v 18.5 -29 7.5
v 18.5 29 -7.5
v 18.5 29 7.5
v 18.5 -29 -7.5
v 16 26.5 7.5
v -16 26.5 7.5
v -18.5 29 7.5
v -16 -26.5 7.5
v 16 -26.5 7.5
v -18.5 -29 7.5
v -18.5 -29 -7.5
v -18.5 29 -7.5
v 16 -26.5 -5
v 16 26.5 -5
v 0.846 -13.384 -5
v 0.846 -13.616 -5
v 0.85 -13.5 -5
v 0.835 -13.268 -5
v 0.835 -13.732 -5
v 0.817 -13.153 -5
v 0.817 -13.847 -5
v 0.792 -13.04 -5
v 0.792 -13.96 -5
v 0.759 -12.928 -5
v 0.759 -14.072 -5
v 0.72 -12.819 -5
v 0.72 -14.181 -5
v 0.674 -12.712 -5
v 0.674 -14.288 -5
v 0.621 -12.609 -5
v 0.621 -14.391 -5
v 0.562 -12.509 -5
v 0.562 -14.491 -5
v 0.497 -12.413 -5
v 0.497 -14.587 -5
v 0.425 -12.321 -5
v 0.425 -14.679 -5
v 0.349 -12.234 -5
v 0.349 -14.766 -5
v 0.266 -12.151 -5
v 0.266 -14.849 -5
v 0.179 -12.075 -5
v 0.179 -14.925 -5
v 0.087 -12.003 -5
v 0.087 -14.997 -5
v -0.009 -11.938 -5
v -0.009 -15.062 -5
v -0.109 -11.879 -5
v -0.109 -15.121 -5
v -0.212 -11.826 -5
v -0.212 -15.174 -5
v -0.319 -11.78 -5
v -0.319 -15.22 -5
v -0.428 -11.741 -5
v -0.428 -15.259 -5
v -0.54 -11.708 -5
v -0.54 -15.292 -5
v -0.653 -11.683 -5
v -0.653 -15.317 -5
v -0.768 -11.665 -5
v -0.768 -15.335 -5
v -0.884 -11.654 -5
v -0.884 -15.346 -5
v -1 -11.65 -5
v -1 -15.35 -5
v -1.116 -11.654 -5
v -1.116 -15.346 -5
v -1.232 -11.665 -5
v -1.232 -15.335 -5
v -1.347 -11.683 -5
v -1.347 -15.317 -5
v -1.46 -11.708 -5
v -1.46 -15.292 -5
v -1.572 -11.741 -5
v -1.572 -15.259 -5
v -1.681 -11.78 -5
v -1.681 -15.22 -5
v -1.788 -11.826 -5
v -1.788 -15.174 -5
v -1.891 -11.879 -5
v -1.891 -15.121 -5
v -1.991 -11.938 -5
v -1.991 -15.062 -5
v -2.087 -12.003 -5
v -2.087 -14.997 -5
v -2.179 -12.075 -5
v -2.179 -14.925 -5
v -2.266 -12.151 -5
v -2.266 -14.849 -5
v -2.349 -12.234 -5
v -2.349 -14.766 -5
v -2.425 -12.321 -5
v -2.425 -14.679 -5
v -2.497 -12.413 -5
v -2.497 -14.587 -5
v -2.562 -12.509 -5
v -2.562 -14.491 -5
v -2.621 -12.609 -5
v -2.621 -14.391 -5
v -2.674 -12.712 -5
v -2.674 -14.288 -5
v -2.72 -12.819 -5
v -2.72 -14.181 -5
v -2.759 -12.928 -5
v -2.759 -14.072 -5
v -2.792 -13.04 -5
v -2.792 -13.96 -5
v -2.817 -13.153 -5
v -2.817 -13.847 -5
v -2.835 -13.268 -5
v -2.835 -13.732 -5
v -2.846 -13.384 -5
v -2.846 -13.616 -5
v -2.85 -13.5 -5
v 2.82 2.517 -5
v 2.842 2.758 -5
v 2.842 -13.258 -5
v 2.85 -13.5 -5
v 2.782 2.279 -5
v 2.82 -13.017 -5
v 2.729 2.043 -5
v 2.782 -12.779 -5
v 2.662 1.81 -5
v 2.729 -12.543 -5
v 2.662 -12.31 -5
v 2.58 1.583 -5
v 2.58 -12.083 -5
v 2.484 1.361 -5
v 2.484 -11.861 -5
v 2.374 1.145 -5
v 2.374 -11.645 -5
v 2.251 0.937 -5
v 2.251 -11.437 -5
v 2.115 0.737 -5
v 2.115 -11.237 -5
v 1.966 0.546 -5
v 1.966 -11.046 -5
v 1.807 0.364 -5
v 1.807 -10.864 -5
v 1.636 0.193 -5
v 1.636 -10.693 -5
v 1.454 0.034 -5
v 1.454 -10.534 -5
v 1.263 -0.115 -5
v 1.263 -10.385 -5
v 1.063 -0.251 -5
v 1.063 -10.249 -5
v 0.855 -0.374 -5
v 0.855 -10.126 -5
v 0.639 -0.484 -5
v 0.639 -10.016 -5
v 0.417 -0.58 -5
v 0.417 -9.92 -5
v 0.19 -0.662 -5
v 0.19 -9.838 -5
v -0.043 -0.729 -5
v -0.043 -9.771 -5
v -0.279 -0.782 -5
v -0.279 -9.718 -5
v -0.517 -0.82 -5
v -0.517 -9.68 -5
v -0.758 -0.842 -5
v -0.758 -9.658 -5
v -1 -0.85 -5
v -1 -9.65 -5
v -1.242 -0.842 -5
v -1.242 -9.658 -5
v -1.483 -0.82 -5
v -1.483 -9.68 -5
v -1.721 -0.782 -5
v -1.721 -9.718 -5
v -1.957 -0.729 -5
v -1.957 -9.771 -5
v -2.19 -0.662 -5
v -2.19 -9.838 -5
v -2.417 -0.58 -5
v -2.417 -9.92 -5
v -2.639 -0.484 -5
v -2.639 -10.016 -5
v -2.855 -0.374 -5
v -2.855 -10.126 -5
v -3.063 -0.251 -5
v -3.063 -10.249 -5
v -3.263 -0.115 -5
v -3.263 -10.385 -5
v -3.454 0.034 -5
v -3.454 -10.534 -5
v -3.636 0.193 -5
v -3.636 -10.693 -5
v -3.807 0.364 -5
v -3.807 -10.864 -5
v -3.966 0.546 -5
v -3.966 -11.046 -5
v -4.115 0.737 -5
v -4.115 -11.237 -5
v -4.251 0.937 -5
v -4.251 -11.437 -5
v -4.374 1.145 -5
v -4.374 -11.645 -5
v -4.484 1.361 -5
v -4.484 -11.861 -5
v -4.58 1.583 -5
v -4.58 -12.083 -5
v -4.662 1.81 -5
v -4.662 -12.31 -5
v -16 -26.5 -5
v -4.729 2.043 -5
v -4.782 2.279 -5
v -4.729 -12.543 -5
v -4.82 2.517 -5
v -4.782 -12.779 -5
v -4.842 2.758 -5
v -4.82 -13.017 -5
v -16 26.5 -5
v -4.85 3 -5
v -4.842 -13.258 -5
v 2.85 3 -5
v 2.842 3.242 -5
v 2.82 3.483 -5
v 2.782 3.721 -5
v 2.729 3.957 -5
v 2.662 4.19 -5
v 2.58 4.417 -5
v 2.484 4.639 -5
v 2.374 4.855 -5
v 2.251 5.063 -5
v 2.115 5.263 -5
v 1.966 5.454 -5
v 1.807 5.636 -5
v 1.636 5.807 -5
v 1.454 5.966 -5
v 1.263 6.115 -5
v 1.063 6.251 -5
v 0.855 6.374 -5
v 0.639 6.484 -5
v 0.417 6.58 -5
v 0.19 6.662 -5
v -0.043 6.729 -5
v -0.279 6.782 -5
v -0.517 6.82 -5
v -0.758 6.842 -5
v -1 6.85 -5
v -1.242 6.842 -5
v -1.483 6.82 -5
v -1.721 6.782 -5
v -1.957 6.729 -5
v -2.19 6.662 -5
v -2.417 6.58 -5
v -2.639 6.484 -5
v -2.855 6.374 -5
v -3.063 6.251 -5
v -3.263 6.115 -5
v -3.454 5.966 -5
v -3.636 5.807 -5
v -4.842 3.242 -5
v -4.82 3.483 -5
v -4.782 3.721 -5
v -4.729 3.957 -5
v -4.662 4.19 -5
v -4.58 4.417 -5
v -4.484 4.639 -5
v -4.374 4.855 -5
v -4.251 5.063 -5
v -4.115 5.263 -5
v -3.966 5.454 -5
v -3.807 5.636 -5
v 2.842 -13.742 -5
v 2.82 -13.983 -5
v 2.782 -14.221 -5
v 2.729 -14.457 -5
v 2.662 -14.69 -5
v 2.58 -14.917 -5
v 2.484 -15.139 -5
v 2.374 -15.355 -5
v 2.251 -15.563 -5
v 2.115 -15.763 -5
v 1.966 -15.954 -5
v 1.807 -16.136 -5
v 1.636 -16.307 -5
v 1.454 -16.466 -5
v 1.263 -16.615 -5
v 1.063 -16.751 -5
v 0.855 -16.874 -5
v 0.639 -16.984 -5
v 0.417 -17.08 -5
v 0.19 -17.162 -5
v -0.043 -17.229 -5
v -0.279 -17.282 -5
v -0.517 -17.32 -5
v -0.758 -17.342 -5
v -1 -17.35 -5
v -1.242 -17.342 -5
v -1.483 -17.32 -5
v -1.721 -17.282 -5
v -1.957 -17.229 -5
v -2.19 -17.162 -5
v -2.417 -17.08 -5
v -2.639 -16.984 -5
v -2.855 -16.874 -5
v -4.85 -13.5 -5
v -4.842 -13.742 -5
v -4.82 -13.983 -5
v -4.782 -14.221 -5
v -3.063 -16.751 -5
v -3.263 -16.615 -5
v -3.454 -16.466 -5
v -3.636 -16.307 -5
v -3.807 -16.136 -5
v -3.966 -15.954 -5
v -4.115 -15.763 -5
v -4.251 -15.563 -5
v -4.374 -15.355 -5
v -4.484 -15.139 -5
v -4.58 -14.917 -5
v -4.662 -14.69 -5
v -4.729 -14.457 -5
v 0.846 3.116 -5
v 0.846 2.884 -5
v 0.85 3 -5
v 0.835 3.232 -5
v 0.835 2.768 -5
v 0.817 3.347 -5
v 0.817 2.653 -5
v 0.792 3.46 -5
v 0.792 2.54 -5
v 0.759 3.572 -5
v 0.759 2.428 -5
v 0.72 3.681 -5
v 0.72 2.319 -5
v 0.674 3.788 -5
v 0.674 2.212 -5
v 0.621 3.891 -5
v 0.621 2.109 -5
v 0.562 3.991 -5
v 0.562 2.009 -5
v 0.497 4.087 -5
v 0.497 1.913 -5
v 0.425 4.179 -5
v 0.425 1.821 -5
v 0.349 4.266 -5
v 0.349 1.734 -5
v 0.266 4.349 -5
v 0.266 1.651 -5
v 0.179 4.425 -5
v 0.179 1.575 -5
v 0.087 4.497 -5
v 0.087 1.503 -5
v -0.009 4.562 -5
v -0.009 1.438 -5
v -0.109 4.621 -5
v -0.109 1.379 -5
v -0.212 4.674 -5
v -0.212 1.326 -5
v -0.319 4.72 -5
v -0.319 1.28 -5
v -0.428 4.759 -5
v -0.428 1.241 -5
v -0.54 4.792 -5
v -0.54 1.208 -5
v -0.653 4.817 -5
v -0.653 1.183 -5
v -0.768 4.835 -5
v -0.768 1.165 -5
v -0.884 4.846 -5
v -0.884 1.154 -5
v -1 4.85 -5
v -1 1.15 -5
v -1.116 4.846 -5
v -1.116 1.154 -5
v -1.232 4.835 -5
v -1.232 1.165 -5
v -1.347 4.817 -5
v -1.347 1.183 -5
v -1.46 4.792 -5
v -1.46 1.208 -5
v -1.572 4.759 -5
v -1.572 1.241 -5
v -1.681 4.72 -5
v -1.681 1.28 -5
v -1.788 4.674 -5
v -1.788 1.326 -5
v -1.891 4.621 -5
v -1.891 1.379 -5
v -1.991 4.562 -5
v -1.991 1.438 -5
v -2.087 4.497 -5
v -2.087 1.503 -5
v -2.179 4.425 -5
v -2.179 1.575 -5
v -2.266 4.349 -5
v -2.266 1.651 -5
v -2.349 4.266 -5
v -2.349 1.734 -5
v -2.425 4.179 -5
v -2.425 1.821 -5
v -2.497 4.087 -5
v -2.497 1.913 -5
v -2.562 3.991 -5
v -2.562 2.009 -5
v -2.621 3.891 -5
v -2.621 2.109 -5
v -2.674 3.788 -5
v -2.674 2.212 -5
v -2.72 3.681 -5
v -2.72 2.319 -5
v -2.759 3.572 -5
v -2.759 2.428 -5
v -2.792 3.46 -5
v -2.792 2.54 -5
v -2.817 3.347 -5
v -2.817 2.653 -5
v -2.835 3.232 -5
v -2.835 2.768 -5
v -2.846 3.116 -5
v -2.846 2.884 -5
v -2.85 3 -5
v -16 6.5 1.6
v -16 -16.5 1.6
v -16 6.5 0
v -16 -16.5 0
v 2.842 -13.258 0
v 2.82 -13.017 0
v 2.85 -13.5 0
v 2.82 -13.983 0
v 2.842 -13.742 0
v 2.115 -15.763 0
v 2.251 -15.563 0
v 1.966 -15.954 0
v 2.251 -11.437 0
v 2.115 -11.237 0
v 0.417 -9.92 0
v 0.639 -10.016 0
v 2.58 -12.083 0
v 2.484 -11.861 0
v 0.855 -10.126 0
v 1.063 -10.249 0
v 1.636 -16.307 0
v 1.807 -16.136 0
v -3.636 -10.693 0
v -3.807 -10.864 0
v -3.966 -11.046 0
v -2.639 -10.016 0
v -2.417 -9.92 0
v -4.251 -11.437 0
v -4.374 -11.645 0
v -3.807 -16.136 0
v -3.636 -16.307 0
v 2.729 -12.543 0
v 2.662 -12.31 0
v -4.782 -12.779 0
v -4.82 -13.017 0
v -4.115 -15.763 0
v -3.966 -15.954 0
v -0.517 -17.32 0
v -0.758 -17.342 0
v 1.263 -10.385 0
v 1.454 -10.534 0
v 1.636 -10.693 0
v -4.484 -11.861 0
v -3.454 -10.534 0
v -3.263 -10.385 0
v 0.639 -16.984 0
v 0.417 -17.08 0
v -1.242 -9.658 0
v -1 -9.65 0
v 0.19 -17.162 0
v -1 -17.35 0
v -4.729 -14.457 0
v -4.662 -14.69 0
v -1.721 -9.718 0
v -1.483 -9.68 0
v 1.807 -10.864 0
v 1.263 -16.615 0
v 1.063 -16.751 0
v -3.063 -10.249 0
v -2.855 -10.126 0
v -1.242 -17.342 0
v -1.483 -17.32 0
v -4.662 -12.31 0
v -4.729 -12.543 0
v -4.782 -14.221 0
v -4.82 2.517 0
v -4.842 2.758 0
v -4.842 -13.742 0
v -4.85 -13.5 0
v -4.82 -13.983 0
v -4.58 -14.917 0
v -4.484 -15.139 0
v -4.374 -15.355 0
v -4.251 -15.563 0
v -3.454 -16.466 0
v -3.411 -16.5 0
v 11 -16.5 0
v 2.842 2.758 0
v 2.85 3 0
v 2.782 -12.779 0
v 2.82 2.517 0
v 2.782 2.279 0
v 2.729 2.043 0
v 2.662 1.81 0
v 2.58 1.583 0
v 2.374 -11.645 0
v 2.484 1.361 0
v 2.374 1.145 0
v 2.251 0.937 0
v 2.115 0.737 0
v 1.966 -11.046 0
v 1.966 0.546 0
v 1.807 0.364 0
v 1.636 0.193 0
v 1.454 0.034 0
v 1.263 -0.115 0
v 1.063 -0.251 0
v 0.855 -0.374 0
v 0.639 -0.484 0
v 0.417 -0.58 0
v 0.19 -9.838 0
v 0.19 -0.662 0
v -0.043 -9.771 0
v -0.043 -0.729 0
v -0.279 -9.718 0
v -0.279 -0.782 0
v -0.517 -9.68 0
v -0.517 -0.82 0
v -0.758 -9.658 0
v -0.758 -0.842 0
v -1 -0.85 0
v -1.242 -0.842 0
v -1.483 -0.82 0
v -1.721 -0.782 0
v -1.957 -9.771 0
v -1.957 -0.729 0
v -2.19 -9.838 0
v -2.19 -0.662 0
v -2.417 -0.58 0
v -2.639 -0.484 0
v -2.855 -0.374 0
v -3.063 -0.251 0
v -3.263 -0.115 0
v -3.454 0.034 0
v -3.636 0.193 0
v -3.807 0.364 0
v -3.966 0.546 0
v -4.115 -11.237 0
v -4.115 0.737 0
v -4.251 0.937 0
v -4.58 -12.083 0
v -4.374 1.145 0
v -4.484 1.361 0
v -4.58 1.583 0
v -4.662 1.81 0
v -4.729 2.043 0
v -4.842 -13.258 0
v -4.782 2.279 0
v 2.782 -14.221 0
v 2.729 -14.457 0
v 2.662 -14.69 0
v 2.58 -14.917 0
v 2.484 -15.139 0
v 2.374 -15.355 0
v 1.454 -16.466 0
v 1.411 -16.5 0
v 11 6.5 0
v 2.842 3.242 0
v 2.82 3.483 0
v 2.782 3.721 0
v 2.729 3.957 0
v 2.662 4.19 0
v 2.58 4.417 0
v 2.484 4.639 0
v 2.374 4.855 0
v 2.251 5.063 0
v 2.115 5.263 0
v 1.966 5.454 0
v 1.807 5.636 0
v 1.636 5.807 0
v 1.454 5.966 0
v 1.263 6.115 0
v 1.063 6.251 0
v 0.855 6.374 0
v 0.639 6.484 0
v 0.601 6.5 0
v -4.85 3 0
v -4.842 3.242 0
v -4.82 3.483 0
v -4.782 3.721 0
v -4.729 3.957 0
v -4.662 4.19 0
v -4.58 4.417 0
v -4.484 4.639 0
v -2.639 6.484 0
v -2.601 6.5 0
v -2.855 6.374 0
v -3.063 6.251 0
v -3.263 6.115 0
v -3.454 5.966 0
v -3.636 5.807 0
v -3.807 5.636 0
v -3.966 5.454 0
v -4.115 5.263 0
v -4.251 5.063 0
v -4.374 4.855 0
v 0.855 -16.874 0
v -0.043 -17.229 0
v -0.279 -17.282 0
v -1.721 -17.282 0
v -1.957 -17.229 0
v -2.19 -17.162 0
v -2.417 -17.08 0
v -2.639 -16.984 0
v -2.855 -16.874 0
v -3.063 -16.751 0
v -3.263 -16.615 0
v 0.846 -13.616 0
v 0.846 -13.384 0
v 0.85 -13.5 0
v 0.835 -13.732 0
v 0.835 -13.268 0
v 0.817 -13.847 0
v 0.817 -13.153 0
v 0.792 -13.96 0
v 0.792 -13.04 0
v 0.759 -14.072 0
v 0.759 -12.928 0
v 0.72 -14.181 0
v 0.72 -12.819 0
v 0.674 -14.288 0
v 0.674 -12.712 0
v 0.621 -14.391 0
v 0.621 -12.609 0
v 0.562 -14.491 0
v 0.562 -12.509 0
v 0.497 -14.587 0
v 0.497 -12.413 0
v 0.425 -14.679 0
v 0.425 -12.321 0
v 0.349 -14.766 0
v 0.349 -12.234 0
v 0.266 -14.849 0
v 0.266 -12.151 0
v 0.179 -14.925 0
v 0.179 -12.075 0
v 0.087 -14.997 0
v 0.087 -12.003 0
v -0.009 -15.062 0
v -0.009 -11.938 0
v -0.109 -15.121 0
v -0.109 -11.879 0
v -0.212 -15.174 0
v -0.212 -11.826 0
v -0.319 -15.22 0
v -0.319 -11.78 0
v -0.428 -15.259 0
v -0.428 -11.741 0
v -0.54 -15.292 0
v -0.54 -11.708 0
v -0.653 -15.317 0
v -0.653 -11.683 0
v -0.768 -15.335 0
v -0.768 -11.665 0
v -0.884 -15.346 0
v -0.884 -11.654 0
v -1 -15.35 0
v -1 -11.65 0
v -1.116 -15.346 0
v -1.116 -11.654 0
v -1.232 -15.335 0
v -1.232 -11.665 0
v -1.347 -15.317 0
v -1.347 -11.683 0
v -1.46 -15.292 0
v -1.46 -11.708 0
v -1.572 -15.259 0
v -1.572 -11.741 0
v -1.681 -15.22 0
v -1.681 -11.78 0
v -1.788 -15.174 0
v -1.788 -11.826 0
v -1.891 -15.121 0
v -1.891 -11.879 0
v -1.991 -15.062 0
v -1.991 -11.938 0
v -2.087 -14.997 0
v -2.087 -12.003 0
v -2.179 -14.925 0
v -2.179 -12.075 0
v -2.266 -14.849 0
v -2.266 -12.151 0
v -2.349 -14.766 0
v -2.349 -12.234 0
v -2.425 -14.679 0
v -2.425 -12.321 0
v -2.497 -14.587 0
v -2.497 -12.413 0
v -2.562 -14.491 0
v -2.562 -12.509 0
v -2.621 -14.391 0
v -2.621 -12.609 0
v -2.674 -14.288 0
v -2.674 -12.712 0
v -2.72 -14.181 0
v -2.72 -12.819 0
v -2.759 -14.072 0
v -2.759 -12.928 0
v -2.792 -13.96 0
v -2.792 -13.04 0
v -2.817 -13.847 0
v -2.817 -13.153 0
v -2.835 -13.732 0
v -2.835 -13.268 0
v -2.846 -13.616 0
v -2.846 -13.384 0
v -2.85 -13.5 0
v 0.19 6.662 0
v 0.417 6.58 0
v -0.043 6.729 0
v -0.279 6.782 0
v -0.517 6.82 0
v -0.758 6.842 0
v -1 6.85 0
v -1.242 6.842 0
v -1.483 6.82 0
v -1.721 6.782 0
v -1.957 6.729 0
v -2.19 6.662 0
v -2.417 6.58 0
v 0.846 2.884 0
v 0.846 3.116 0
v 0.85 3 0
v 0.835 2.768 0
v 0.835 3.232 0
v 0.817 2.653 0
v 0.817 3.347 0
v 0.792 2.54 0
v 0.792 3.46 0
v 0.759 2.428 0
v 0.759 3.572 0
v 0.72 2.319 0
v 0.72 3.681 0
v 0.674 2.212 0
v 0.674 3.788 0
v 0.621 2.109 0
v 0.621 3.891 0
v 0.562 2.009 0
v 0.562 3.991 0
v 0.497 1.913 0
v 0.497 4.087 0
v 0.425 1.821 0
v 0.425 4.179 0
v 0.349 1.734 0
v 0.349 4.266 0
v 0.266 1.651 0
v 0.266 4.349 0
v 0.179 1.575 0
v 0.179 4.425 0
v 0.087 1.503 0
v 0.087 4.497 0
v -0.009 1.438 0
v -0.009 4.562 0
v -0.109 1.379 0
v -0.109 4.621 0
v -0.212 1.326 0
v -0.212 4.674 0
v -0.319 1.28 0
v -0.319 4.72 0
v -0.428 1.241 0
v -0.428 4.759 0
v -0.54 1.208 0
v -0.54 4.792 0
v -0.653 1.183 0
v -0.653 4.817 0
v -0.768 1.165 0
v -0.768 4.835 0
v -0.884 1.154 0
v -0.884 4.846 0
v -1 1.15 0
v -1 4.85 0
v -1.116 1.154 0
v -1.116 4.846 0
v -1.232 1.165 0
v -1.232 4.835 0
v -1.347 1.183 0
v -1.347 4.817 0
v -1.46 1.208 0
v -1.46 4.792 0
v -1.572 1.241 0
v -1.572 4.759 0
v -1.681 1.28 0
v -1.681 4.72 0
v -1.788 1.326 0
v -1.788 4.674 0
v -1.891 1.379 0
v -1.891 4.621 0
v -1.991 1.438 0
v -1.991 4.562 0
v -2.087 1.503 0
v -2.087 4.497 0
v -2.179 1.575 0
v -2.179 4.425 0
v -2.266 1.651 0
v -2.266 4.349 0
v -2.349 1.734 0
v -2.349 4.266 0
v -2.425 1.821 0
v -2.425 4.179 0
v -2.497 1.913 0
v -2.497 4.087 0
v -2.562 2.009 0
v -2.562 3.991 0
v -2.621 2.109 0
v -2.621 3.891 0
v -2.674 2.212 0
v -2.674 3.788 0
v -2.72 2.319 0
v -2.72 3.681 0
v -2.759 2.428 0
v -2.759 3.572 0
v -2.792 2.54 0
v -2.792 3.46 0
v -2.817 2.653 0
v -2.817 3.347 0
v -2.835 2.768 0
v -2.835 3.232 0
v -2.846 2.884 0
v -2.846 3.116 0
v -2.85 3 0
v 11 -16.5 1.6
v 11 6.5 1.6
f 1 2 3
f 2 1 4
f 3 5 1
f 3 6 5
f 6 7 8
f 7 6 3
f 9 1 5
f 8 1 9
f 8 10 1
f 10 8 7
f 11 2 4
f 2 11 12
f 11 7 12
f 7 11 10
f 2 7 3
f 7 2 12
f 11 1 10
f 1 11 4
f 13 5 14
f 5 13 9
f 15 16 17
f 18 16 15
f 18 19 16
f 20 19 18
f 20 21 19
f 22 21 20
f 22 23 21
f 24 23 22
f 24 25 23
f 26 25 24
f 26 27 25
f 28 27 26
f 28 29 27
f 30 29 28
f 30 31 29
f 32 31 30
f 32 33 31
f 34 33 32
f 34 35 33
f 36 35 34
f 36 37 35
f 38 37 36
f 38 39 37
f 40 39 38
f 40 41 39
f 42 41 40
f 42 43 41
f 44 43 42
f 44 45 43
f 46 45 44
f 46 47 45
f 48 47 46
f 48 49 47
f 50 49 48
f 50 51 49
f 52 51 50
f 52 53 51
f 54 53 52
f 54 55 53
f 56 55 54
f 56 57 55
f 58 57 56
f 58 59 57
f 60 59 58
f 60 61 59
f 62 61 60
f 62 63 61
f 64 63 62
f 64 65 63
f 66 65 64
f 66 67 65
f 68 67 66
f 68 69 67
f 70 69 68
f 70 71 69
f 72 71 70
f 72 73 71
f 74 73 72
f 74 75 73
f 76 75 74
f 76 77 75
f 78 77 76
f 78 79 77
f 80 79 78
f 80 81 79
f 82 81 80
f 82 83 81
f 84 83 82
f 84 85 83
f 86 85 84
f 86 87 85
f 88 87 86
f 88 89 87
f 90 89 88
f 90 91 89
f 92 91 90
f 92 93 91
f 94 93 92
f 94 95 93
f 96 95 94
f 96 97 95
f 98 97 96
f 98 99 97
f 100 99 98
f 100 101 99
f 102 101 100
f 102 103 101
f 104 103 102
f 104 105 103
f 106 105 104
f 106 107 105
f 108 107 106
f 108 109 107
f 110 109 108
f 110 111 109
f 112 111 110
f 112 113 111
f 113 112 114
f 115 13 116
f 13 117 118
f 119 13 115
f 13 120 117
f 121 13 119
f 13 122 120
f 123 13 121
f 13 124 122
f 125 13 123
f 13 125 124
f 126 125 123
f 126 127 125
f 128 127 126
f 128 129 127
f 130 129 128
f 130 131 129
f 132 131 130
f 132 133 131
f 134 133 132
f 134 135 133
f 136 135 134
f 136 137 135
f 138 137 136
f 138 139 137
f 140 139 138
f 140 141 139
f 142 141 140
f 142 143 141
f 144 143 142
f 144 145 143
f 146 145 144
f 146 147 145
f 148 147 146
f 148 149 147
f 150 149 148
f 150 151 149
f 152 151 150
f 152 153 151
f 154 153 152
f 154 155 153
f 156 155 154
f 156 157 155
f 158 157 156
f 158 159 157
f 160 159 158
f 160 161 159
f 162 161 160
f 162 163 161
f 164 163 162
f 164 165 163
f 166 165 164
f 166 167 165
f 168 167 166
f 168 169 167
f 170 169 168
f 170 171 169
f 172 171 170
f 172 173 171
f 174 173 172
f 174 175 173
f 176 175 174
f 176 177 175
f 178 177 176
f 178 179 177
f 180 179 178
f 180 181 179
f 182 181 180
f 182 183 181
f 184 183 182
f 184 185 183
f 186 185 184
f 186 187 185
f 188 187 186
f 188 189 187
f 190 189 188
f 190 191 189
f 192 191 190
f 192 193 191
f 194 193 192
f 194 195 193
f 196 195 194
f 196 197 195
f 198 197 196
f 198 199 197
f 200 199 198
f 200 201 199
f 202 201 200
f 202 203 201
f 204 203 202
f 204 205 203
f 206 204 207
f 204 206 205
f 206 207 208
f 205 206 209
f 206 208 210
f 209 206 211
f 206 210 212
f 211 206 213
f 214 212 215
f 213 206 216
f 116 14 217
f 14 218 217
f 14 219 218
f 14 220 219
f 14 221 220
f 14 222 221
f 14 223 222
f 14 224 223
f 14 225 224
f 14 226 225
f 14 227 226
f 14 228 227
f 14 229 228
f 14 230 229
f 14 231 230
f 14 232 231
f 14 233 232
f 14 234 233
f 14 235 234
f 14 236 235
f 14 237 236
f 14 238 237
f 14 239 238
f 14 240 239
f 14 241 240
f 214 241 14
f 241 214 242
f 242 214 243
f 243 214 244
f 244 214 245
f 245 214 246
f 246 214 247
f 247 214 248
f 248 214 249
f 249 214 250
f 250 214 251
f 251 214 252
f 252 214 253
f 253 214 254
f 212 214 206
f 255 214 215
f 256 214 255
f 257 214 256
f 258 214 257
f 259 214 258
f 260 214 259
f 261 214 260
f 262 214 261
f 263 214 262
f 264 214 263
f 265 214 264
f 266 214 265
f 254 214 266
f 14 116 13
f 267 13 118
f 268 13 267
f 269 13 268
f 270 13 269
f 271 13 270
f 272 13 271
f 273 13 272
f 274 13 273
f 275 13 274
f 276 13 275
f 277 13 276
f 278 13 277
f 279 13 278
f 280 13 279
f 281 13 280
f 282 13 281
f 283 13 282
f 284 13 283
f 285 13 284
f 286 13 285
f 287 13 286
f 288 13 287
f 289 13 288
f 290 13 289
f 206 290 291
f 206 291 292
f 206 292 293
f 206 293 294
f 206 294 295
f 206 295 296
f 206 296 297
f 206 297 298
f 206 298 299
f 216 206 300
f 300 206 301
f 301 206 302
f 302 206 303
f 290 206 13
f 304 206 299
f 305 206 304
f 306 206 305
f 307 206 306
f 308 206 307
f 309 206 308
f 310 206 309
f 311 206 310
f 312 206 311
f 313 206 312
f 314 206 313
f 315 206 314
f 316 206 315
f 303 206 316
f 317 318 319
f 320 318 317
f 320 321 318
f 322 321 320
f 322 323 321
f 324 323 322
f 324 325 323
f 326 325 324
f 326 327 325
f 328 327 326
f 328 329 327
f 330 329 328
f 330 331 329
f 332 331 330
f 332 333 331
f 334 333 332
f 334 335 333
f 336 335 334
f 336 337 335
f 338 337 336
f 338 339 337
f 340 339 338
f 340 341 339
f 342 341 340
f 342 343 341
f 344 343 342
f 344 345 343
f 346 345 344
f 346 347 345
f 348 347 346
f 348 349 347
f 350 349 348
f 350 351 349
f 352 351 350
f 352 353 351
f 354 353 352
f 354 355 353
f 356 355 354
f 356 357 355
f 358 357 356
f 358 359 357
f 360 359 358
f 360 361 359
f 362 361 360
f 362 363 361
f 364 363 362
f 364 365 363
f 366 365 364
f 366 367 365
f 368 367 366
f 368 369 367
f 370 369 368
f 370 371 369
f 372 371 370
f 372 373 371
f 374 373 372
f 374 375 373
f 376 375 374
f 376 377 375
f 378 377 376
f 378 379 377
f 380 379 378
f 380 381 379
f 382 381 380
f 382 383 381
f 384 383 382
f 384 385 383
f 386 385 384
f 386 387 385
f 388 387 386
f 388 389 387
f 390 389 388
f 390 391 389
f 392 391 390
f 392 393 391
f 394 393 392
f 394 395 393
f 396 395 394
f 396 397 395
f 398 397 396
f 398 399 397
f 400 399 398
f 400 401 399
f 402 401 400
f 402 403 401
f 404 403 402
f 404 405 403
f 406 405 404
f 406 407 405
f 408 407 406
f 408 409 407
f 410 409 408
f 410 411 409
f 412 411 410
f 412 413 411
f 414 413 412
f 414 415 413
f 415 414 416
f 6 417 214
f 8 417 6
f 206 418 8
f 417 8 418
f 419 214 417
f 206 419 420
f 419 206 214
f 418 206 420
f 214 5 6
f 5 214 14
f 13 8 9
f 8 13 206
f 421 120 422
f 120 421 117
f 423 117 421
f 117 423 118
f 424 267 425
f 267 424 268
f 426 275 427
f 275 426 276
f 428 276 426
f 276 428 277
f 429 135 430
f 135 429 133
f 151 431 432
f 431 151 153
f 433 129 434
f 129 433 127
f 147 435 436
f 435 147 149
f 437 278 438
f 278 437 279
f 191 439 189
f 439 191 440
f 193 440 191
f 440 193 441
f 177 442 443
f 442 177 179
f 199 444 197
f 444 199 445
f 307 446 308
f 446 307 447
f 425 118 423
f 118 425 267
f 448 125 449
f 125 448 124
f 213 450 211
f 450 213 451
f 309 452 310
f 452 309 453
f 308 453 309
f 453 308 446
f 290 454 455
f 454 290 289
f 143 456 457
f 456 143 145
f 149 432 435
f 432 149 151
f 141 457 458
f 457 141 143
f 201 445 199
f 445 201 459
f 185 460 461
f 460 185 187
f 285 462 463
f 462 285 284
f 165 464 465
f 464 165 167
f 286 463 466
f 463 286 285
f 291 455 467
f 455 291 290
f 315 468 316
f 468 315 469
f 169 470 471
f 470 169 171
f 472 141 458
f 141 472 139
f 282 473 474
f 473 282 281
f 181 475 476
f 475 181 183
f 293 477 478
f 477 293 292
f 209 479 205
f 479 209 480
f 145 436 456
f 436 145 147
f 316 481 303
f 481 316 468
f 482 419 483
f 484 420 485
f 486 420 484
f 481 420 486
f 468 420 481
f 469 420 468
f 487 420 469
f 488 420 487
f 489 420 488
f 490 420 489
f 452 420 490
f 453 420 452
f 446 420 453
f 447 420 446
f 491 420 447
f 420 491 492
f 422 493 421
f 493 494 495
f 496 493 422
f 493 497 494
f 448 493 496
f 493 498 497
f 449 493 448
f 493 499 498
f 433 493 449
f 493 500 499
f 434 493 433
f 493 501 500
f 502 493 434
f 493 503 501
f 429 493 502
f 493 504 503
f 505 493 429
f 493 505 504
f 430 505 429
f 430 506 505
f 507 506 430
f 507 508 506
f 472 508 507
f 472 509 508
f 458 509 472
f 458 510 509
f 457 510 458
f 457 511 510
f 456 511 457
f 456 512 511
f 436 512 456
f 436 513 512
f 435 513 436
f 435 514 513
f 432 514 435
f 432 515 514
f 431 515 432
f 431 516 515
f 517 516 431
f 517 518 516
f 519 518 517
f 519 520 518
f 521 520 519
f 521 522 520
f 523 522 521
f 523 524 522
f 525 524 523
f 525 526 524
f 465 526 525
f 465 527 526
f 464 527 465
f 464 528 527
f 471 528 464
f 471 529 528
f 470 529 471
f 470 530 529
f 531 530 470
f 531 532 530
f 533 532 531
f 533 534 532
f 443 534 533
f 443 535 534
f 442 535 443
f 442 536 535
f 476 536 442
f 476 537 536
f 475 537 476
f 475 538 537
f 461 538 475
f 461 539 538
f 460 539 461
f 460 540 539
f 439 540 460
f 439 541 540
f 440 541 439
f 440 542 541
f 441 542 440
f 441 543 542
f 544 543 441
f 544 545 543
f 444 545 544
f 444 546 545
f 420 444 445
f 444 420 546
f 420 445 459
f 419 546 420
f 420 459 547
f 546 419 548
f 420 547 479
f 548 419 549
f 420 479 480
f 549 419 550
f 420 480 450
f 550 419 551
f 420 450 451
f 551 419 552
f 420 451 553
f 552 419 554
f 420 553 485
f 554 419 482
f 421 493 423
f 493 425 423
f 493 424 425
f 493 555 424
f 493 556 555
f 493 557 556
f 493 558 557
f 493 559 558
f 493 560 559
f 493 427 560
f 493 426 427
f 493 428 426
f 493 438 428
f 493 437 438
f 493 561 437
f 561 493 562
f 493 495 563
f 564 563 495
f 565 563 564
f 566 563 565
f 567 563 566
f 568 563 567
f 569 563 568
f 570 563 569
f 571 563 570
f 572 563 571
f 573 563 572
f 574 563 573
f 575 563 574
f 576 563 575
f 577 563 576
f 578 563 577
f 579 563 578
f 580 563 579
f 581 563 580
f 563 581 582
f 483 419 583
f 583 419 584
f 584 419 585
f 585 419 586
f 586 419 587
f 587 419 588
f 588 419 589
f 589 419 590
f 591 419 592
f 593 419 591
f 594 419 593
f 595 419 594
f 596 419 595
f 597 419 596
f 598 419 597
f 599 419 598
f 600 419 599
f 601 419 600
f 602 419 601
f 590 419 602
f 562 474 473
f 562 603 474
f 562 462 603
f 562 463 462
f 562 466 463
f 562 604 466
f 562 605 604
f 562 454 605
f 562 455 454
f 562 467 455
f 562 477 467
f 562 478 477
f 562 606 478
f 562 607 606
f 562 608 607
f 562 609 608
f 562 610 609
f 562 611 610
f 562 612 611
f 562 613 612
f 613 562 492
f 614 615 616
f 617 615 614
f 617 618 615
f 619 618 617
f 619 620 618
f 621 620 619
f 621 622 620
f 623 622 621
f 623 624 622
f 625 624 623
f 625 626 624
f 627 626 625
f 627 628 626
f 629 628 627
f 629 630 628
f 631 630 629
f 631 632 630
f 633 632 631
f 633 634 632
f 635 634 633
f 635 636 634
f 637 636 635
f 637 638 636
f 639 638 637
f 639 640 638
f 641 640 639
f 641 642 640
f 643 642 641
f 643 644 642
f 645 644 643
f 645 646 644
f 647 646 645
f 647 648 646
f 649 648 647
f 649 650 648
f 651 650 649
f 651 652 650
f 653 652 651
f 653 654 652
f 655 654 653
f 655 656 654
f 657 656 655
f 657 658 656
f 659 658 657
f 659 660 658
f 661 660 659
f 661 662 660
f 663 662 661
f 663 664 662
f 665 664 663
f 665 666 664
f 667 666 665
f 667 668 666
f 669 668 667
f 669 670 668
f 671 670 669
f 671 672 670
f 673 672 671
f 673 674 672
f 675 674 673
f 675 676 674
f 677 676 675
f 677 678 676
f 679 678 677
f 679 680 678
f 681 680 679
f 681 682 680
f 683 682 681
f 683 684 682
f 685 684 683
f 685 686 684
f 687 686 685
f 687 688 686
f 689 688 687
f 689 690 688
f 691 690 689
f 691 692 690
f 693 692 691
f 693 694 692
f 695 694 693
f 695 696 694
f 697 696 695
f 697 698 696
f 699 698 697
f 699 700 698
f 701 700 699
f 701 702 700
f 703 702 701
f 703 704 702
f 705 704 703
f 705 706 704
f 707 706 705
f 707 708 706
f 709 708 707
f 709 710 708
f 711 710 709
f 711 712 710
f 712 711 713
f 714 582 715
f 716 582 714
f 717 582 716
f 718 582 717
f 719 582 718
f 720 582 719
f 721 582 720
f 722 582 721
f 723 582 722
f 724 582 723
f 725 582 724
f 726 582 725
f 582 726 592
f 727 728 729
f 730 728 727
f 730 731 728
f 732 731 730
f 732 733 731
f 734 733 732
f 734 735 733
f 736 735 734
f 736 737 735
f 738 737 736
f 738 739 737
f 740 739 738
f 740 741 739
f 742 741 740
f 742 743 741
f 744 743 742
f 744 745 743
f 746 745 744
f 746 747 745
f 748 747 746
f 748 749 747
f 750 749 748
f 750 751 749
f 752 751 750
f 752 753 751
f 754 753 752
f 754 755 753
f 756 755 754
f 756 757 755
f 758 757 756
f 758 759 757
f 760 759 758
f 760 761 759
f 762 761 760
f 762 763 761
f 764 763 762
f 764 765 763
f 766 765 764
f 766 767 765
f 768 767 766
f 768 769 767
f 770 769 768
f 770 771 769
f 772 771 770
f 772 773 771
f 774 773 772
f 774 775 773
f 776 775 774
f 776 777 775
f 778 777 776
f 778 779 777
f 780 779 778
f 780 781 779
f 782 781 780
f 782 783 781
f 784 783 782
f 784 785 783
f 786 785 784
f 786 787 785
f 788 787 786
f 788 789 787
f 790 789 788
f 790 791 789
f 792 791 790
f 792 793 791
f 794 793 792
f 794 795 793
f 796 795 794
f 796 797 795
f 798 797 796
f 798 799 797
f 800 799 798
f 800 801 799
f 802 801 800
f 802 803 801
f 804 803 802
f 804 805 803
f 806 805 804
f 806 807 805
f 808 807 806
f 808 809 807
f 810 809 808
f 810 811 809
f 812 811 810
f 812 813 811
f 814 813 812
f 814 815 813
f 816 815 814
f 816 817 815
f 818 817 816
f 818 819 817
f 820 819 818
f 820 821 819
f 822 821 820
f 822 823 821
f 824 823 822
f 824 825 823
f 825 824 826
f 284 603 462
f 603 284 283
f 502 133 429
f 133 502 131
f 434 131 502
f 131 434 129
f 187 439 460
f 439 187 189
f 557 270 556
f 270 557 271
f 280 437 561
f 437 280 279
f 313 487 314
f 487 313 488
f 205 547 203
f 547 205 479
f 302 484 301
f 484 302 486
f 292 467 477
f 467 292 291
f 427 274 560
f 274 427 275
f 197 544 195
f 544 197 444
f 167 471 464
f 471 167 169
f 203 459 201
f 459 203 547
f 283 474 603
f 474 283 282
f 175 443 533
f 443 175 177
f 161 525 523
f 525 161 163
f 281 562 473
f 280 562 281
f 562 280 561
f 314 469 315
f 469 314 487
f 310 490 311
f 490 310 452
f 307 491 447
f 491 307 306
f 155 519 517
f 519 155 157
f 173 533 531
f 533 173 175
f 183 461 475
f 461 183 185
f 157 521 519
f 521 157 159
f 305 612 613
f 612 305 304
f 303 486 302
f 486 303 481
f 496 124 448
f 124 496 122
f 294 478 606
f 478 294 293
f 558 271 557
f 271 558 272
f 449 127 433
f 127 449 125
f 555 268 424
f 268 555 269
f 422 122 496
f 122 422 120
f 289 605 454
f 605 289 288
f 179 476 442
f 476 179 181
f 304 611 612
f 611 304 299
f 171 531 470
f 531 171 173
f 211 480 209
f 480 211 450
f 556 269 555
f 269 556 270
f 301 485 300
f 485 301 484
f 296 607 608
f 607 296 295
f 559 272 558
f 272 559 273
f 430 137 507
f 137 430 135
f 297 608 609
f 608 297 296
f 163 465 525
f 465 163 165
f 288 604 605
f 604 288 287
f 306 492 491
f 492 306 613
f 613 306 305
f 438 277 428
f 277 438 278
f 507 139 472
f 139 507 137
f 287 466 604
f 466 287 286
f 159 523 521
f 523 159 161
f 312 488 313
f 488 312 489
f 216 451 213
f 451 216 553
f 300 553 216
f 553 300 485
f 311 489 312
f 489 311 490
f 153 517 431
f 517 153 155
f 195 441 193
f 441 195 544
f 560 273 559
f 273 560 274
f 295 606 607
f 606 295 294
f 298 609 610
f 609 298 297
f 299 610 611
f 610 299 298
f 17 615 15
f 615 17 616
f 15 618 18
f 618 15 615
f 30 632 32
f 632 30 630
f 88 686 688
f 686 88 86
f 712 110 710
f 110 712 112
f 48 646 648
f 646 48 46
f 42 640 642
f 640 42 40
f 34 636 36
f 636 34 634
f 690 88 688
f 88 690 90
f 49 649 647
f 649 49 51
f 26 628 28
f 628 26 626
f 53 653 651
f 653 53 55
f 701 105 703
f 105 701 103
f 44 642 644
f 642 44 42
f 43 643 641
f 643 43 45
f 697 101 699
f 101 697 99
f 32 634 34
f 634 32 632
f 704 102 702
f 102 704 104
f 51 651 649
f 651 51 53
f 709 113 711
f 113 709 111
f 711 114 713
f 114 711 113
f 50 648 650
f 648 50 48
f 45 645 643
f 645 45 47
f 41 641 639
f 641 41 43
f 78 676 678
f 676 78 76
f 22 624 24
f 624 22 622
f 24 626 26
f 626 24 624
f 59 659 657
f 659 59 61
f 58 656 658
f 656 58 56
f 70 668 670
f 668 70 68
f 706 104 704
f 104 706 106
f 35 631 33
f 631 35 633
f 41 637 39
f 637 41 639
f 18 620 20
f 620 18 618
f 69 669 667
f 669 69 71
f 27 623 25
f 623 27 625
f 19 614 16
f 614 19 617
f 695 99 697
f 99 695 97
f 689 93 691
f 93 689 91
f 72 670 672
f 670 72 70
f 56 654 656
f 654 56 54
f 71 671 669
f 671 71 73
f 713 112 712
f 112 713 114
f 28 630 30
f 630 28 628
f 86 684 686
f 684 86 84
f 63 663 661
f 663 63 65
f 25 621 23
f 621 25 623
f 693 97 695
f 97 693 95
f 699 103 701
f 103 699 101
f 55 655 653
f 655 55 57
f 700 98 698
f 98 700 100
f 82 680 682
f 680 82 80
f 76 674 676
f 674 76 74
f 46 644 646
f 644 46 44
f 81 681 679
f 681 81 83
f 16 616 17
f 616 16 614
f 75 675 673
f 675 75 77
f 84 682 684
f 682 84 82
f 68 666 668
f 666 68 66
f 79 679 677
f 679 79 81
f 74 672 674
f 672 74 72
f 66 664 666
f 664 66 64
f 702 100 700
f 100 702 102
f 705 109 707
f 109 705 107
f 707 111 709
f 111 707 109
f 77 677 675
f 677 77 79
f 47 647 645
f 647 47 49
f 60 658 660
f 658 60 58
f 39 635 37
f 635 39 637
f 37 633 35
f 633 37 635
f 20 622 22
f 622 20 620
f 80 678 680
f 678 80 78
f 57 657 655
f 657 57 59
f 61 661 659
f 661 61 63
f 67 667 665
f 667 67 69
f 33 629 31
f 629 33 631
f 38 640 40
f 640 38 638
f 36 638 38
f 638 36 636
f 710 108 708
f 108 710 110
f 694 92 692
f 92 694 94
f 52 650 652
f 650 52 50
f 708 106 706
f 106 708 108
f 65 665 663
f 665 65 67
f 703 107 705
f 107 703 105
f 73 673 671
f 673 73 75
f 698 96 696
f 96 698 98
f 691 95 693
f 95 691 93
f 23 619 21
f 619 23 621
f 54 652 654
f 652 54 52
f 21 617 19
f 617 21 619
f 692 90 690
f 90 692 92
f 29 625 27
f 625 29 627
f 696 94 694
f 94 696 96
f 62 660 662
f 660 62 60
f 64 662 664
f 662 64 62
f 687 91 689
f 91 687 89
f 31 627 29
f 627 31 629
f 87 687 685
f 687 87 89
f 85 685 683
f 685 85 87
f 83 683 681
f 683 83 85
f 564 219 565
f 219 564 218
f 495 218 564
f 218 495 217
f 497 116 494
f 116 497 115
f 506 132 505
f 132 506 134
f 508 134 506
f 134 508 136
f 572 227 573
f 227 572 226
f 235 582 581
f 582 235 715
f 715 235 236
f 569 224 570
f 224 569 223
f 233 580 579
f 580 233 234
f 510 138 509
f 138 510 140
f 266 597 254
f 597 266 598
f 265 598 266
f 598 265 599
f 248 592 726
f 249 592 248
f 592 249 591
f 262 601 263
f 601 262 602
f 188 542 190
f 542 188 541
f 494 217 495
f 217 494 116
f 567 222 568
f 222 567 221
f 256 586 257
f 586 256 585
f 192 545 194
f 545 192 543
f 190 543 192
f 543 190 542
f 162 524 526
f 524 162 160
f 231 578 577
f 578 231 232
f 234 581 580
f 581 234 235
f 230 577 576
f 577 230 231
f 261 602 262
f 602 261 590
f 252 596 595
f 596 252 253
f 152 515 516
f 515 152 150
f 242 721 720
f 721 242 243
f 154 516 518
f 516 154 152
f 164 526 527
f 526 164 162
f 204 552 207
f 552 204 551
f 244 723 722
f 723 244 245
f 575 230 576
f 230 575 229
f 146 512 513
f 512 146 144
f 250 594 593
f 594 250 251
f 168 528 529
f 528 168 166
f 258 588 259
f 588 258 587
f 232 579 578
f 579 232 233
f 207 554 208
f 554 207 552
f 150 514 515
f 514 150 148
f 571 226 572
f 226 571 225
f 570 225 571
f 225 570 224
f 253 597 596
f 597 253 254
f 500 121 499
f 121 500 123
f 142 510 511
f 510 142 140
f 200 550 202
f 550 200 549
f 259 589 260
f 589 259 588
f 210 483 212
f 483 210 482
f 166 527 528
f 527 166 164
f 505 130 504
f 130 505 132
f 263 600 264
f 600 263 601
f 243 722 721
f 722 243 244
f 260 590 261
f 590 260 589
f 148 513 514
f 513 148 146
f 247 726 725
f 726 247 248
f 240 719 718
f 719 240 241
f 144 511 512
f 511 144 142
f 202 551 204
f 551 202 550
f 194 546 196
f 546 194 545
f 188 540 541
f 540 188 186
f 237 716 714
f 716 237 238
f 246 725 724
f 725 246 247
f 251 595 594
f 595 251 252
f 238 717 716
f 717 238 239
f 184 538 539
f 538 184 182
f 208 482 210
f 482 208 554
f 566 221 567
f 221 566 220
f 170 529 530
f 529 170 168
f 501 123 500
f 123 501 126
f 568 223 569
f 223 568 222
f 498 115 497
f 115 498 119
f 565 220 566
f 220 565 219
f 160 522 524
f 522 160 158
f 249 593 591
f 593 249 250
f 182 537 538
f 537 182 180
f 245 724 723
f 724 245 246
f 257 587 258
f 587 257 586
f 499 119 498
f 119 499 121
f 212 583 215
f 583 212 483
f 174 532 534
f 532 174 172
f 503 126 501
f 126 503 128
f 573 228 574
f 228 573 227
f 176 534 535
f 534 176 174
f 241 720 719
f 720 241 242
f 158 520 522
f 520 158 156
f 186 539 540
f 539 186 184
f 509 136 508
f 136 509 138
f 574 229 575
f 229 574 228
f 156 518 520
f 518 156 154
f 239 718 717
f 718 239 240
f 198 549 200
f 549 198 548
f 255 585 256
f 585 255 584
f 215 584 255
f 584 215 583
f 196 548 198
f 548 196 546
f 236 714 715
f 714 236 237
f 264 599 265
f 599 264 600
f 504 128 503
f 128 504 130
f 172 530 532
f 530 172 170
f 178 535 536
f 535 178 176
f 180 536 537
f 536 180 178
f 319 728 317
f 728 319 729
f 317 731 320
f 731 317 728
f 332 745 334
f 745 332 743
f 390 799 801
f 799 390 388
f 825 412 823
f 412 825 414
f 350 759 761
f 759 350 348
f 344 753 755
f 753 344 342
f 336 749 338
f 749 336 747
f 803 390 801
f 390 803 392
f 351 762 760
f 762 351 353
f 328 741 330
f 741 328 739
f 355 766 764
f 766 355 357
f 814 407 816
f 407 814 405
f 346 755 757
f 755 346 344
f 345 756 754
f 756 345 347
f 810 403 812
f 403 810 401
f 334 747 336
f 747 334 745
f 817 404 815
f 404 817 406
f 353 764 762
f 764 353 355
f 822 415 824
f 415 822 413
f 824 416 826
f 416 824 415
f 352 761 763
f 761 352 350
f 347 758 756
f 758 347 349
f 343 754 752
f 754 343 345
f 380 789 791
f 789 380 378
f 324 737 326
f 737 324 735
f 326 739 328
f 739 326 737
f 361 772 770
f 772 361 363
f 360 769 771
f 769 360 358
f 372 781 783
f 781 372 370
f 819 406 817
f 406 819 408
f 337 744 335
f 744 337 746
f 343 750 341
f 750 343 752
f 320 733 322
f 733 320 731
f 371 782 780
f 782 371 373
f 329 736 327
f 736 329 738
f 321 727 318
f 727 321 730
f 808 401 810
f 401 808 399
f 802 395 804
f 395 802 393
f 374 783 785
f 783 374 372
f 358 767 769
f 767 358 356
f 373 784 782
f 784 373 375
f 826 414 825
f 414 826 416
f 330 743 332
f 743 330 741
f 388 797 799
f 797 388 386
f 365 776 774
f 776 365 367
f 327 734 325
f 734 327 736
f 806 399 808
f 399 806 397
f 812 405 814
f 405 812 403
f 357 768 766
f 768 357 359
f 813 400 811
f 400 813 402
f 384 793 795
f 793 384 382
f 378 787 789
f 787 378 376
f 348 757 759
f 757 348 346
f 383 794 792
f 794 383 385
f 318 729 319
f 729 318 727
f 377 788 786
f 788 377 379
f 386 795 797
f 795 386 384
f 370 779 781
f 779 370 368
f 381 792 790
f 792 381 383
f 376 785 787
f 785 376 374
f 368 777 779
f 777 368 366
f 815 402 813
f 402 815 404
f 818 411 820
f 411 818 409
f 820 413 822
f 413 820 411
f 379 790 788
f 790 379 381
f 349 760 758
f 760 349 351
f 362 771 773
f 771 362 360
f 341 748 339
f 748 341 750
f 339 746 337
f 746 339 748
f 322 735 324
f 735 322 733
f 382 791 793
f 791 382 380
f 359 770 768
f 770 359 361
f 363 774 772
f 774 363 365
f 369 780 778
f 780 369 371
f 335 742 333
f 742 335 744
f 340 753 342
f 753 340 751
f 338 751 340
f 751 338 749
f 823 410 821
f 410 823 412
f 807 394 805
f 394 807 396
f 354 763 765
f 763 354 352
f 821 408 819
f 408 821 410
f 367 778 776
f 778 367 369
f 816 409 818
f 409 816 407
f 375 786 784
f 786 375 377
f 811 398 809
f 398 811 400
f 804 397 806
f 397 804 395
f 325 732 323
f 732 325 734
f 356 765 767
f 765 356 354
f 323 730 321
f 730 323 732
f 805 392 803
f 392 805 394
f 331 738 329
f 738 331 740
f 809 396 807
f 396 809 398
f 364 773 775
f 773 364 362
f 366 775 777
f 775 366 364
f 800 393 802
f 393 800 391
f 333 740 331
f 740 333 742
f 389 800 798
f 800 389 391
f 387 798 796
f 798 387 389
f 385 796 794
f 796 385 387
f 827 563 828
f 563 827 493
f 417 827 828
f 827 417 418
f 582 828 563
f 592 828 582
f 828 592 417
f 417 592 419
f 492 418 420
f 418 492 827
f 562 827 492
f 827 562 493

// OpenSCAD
sensor_pcb_w = 27;
sensor_pcb_h = 23;

sensor_w = sensor_pcb_w +5;
sensor_h = sensor_pcb_h + 30;
sensor_d = 15;
wall_thickness = 2.5;

module insert_nut_cover() {
	inner_d = 3.7;
	outer_d = inner_d+4;
	cover_h = 5;
	difference() {
		cylinder(d=outer_d, h=cover_h+wall_thickness, $fn=100);
		translate([0, 0, wall_thickness]) cylinder(d=inner_d, h=cover_h+wall_thickness, $fn=100);
	}
}

module sensor_base() {
	base_w = sensor_w+2*wall_thickness;
	base_h = sensor_h+2*wall_thickness;

	difference() {
		cube(size=[base_w, base_h, sensor_d], center=true);
		translate([0, 0, wall_thickness]) cube(size=[sensor_w, sensor_h, sensor_d], center=true);
		// connector cutout

	}
	// pcb holders
	pcb_y_offset = 10;
	translate([sensor_w/-2+15, sensor_h/-2+pcb_y_offset+3, sensor_d/-2]) insert_nut_cover();
	translate([sensor_w/-2+15, sensor_h/-2+pcb_y_offset+3+16.5, sensor_d/-2]) insert_nut_cover();
	// tmp pcb
	translate([sensor_w/-2, sensor_h/-2+pcb_y_offset, 0]) cube(size=[sensor_pcb_w, sensor_pcb_h, 1.6]);

}

sensor_base();
